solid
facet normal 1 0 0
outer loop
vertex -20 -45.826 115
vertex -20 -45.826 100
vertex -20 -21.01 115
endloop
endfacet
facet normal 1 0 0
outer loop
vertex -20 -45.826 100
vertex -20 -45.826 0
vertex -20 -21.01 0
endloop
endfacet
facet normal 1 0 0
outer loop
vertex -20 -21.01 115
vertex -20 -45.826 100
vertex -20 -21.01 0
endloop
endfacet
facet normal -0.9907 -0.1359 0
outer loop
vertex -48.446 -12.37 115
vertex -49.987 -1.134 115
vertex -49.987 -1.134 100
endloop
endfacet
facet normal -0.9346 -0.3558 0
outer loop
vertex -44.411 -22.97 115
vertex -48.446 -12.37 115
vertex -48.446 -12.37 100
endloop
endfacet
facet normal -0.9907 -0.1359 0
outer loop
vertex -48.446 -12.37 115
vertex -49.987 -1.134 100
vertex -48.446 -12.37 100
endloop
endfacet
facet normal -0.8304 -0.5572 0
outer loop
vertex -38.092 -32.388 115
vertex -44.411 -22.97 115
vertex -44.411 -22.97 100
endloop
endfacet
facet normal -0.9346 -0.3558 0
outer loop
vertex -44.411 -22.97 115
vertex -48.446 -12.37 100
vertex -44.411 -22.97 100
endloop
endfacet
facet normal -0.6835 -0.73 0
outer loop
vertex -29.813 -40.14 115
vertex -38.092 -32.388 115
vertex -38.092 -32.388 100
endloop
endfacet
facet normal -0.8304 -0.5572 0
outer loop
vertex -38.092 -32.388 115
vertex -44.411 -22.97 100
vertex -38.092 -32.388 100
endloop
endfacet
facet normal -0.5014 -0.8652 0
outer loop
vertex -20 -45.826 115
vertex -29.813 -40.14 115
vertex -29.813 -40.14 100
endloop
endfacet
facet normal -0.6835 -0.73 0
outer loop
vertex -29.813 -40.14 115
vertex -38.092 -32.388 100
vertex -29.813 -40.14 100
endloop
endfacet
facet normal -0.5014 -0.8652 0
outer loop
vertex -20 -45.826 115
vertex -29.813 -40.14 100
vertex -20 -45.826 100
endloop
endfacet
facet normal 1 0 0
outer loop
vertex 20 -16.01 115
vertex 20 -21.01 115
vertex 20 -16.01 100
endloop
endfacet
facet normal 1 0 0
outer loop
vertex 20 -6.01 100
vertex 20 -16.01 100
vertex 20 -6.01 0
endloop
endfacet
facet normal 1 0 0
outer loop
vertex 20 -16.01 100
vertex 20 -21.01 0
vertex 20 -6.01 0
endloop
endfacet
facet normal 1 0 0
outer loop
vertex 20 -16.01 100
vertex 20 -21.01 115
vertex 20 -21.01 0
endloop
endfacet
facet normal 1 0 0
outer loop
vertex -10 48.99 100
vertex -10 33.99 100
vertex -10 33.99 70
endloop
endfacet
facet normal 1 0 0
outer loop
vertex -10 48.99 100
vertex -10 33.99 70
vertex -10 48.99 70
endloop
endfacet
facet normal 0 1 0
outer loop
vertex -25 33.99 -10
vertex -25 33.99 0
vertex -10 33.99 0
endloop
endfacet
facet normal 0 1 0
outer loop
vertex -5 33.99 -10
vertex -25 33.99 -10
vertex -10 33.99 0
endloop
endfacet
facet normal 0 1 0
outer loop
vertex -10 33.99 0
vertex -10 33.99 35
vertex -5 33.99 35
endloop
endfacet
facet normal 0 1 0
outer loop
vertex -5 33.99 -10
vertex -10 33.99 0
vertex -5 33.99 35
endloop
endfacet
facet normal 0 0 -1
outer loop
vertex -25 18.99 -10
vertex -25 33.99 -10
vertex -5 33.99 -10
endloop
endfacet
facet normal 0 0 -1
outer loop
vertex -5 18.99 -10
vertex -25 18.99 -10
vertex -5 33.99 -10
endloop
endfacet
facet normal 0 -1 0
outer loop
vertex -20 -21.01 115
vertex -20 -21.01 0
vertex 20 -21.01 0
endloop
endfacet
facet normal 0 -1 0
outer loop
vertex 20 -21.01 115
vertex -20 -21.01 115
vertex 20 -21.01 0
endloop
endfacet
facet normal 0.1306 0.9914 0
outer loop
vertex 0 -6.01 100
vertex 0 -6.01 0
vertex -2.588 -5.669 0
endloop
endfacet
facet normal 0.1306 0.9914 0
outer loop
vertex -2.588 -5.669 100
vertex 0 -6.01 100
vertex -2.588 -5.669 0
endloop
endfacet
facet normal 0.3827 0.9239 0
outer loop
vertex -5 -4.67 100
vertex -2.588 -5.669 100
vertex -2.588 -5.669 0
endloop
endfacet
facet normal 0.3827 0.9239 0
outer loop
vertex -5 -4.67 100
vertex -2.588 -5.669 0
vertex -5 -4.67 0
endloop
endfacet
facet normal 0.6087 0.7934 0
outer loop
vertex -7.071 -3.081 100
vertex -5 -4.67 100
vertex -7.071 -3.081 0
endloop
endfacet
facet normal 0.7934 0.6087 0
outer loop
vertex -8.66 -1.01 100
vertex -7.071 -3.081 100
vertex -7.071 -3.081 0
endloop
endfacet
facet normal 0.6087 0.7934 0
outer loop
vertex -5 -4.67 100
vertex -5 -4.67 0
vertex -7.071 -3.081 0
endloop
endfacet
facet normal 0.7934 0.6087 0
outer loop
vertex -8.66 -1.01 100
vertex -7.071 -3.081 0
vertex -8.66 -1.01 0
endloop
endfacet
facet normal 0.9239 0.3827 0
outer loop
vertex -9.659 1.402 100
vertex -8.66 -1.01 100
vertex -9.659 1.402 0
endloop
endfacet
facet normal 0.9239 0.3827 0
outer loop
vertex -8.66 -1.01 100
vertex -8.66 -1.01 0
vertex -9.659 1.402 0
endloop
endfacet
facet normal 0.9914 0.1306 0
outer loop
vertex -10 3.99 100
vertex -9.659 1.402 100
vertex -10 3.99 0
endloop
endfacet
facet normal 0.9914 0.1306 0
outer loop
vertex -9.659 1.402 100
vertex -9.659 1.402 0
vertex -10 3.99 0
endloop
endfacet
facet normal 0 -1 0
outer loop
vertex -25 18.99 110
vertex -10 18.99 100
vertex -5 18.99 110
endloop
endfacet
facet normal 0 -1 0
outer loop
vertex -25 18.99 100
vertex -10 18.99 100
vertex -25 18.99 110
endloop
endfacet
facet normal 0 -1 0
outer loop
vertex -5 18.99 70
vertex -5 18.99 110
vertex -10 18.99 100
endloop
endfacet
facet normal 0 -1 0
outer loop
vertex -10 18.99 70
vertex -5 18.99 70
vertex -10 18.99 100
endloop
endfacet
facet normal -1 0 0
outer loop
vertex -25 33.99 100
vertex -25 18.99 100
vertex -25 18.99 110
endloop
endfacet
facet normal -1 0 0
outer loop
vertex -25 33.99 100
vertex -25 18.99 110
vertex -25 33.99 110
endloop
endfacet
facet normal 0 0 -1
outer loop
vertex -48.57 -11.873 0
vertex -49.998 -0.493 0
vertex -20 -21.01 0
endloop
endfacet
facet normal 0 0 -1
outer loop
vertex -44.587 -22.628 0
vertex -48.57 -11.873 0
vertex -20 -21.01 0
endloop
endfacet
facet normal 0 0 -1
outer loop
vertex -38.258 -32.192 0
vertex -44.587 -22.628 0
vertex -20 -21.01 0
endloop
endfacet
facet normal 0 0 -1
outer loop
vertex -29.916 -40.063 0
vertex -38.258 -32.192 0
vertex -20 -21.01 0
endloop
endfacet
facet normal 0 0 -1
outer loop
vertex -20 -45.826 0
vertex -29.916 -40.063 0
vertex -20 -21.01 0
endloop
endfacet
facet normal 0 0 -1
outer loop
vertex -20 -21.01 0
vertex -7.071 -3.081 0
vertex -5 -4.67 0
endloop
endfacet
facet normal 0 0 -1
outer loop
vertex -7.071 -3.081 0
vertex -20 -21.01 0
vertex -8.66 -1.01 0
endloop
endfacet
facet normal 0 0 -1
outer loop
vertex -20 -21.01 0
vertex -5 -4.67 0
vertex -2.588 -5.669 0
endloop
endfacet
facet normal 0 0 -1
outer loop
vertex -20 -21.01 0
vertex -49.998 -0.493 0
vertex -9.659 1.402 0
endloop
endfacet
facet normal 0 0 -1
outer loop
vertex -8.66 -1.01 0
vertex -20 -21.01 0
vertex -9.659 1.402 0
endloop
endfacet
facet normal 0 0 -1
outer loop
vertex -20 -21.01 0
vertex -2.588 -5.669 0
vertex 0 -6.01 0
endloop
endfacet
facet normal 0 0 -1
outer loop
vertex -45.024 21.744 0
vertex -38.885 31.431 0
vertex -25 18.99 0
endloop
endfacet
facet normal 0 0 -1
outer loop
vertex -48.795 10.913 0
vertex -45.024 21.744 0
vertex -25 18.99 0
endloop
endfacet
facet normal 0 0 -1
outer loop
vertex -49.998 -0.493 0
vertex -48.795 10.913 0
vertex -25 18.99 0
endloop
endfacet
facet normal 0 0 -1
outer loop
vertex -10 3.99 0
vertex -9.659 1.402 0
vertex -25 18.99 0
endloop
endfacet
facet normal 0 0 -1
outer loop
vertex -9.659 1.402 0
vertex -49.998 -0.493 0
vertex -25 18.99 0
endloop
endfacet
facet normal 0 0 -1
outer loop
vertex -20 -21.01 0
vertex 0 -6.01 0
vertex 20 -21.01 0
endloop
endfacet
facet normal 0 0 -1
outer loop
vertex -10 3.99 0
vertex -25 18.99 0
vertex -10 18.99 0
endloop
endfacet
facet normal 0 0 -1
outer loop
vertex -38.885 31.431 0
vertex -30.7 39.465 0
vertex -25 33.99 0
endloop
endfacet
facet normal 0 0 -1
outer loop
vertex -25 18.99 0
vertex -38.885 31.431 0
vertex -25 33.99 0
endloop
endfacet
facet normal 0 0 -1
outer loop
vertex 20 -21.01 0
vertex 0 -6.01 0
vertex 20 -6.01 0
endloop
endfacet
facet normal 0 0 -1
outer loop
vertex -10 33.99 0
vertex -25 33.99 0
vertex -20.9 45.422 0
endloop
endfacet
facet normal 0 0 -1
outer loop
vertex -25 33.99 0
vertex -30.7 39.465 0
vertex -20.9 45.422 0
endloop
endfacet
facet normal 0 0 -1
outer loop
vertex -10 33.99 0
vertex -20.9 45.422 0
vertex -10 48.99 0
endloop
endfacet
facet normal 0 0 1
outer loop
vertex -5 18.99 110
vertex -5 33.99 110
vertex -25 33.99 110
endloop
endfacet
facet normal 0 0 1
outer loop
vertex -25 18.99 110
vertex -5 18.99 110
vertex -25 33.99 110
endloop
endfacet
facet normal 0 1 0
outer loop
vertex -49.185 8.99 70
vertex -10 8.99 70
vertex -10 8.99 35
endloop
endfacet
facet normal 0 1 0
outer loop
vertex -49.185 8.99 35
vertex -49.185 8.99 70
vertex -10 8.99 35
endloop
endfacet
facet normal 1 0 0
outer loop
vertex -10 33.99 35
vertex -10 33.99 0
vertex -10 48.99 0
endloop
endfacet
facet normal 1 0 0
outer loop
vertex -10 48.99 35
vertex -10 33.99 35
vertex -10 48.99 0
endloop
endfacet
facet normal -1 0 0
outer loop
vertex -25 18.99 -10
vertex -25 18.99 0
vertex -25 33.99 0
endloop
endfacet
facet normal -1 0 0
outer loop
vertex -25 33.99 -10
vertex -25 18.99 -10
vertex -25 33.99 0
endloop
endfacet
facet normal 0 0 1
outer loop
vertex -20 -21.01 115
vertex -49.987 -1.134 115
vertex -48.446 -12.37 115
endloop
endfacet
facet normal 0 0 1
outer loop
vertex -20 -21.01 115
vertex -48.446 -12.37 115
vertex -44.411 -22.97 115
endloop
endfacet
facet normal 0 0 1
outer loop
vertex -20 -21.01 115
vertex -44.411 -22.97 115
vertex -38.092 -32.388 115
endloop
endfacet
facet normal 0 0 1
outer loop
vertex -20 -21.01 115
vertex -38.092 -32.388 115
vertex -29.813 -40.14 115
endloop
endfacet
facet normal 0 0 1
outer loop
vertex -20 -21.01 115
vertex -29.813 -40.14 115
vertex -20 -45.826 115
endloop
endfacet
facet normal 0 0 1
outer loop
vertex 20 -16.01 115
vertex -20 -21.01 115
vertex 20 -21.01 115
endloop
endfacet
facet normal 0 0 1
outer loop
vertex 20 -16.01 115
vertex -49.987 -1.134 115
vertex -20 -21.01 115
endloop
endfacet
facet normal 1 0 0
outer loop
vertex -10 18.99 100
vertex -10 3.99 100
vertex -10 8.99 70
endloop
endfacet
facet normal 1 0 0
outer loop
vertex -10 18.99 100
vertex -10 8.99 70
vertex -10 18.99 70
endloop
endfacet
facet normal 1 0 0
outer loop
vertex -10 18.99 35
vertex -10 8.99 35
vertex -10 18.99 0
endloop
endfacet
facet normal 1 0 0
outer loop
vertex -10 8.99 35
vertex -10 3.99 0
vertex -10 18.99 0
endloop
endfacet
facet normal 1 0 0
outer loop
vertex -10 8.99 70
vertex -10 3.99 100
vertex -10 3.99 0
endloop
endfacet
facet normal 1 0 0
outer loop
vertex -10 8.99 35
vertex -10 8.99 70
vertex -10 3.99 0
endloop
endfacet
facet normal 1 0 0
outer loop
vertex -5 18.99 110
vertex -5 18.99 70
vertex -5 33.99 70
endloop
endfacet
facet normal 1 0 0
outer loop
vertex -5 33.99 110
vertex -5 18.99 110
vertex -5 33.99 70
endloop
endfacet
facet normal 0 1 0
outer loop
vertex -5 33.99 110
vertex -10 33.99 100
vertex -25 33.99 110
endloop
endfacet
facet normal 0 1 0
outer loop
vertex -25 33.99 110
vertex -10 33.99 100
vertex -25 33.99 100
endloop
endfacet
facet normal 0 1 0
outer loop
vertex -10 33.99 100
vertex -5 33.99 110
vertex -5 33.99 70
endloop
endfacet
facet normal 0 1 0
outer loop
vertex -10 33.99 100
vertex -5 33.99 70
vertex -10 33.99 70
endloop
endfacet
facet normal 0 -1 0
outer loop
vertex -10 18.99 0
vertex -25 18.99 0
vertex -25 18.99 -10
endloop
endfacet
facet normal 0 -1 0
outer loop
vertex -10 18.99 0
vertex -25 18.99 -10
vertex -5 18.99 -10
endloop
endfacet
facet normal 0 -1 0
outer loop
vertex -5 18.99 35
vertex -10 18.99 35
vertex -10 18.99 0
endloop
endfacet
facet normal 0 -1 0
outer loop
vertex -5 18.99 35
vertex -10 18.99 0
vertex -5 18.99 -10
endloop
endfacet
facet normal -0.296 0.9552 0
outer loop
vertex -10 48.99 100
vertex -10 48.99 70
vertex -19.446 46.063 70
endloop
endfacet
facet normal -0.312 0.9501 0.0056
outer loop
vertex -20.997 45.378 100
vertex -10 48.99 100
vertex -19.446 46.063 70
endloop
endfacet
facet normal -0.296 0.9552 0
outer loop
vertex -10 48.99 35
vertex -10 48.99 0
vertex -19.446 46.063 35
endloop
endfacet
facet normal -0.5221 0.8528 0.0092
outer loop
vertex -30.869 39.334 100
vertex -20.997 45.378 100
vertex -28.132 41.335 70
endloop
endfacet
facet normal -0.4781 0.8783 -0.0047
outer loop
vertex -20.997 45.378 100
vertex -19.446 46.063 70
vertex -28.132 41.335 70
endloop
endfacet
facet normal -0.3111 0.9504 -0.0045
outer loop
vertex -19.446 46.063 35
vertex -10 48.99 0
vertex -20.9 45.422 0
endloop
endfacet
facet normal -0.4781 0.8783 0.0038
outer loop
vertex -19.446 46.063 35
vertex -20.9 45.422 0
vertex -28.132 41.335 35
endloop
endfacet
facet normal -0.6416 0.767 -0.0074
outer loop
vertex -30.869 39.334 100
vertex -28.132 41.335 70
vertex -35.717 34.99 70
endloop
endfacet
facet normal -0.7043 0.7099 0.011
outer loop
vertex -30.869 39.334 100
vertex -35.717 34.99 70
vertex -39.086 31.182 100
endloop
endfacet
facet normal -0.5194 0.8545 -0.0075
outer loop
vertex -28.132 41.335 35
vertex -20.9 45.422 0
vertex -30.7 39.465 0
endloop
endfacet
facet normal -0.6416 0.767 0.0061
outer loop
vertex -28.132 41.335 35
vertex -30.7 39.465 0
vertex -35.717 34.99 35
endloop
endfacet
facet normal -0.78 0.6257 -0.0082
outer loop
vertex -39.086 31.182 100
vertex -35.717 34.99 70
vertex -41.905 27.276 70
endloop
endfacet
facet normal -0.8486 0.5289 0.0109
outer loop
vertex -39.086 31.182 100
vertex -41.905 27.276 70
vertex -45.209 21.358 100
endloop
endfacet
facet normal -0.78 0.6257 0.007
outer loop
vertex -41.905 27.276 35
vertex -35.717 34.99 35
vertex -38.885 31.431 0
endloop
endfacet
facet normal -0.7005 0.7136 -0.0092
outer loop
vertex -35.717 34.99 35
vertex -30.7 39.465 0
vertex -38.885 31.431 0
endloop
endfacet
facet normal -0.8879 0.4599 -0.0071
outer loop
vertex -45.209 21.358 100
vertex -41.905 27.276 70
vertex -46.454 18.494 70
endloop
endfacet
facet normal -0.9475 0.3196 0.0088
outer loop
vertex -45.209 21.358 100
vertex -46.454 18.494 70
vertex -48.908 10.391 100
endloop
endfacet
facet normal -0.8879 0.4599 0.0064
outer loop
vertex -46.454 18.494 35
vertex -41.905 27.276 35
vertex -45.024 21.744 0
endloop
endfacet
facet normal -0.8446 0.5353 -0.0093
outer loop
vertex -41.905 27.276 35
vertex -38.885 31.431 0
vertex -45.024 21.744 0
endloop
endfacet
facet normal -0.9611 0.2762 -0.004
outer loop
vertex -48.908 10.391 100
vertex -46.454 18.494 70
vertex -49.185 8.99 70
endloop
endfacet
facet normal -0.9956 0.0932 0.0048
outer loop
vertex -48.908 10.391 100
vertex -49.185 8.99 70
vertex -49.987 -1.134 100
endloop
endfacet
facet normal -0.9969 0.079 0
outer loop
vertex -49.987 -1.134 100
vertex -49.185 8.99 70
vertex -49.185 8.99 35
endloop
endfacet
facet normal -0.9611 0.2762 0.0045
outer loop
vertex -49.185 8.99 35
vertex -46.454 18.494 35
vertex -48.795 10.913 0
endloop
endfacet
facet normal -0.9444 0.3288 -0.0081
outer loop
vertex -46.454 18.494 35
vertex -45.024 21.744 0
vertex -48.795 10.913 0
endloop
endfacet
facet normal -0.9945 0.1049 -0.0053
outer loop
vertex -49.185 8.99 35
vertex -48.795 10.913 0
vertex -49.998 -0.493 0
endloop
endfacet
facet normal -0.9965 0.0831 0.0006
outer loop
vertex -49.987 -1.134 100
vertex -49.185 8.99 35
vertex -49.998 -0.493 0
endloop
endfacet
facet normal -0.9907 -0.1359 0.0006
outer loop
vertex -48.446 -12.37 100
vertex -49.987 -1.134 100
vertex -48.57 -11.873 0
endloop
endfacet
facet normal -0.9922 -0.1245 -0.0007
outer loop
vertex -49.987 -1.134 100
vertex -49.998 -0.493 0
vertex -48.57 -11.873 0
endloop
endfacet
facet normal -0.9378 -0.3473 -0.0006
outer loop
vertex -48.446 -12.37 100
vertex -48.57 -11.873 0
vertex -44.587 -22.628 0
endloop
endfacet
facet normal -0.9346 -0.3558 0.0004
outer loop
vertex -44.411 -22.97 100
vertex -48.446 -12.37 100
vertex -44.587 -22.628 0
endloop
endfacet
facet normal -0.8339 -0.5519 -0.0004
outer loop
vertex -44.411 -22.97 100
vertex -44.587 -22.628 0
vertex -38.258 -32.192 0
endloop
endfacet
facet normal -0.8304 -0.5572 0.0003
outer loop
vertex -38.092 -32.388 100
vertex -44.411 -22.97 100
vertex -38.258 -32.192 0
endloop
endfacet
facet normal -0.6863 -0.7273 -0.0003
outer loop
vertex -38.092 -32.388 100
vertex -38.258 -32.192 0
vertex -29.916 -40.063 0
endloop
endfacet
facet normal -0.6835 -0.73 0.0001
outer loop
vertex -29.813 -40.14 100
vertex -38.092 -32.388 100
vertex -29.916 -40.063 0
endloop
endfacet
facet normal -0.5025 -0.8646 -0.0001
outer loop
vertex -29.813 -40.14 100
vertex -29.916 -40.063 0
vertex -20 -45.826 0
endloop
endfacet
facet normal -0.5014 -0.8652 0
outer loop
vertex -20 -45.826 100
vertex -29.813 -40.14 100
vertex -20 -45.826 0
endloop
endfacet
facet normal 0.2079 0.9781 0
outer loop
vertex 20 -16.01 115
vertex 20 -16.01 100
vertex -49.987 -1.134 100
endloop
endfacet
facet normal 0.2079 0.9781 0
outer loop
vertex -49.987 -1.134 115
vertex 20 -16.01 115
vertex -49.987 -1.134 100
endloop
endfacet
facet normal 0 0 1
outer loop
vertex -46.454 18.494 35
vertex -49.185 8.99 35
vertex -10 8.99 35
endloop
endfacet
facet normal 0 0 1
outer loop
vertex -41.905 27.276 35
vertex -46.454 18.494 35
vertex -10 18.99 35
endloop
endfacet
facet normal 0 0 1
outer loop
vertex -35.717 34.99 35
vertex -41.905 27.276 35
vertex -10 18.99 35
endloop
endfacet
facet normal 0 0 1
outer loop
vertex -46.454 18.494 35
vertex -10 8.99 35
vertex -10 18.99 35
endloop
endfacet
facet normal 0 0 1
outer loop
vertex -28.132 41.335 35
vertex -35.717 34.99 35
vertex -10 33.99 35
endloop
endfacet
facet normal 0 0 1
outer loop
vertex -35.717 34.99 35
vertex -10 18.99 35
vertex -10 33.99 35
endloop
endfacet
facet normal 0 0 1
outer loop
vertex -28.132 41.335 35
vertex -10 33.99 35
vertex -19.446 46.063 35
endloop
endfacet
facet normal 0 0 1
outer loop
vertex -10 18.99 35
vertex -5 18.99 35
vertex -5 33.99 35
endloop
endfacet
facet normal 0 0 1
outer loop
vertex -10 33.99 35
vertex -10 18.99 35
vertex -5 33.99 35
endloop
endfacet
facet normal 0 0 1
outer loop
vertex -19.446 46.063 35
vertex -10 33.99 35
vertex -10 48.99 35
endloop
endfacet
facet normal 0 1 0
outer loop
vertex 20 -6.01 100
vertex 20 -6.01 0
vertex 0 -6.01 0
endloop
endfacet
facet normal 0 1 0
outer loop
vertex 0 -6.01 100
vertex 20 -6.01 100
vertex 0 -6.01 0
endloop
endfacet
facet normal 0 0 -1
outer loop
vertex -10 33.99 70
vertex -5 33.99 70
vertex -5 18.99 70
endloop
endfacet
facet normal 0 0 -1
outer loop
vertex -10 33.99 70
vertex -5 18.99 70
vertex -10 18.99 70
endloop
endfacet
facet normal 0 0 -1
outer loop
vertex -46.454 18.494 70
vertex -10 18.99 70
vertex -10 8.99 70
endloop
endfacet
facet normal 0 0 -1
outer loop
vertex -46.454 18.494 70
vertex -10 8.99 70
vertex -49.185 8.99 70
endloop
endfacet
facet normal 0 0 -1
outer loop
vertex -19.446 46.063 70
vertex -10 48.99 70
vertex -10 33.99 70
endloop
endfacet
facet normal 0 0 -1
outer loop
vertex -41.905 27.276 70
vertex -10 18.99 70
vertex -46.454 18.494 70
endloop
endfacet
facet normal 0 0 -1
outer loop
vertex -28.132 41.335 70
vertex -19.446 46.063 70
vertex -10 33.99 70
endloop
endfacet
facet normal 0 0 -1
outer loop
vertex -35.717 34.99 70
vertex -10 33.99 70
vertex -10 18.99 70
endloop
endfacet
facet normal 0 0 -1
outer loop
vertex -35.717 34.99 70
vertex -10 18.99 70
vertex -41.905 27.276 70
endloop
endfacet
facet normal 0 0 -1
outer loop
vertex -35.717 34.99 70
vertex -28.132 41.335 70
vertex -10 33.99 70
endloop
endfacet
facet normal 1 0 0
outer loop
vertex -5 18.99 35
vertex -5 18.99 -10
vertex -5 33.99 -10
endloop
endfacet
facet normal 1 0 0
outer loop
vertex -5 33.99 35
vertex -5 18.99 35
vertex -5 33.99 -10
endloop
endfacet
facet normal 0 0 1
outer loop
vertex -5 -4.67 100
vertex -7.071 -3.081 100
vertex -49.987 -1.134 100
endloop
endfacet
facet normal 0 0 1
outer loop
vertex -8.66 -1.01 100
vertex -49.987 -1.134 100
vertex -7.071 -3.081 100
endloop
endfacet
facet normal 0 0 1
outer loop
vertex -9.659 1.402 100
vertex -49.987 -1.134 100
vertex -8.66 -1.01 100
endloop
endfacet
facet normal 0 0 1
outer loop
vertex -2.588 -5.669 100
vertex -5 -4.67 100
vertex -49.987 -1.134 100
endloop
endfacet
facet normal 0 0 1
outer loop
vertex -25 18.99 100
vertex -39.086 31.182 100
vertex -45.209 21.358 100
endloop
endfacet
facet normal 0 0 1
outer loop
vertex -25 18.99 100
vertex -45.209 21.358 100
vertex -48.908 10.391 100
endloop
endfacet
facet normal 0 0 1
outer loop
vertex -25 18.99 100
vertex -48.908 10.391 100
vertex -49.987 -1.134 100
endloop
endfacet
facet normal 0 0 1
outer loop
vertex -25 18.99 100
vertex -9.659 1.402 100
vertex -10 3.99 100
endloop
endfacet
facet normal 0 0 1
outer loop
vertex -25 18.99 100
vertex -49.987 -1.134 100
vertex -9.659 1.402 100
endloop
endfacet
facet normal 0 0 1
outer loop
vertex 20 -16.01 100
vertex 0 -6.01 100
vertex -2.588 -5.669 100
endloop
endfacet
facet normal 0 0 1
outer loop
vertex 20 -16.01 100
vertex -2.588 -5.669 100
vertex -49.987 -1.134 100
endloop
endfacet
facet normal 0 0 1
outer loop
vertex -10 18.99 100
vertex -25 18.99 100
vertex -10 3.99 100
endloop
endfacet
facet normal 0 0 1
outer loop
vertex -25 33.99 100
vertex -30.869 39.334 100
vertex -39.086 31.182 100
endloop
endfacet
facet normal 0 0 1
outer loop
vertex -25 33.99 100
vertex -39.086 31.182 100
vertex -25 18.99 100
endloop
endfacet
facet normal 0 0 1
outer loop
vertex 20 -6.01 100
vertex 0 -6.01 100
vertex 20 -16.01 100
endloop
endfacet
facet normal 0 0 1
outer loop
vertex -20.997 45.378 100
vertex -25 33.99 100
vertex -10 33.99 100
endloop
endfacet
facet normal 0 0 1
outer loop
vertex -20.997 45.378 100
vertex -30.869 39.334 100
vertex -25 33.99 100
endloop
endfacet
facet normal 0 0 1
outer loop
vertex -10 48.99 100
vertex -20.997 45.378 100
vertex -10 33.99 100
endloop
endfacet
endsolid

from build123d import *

# Parameters (mm, degrees)
BOSS_EXTRUDE1_DEPTH = 100
CUT_EXTRUDE1_REACH  = 42
SKETCH2_W           = 35
SKETCH2_H           = 40
SKETCH3_W           = 20
SKETCH3_H           = 15
BOSS_EXTRUDE2_DEPTH = 45
SKETCH4_W           = 20
SKETCH4_H           = 15
BOSS_EXTRUDE3_DEPTH = 40
BOSS_EXTRUDE4_DEPTH = 15


with BuildPart() as part:
    # Sketch1 → Boss-Extrude1 (new body)
    with BuildSketch(Plane.XY):
        with BuildLine():
            Line((-20, -45.82575695), (-20, -21.010205144))
            Line((-20, -21.010205144), (20, -21.010205144))
            Line((20, -21.010205144), (20, -6.010205144))
            Line((20, -6.010205144), (0, -6.010205144))
            ThreePointArc((0, -6.010205144), (-7.071067812, -3.081272956), (-10, 3.989794856))
            Line((-10, 3.989794856), (-10, 48.989794856))
            ThreePointArc((-10, 48.989794856), (-49.724211568, 5.244309675), (-20, -45.82575695))
        make_face()
    extrude(amount=BOSS_EXTRUDE1_DEPTH)

    # Sketch2 → Cut-Extrude1 (cut, up to next)
    with BuildSketch(Plane(origin=(-10, 0, 0), x_dir=(0, 0, -1), z_dir=(1, 0, 0)), mode=Mode.PRIVATE) as cut_extrude1_sk1:
        with Locations((-52.5, 28.989794856)):
            Rectangle(SKETCH2_W, SKETCH2_H)
    cut_extrude1_tool1 = extrude(cut_extrude1_sk1.sketch, amount=-CUT_EXTRUDE1_REACH, mode=Mode.PRIVATE) & part.part
    add(cut_extrude1_tool1.solids().sort_by_distance((-10, 28.989795, 52.5))[0], mode=Mode.SUBTRACT)

    # Sketch3 → Boss-Extrude2 (add)
    with BuildSketch(Plane.XY.offset(35)):
        with Locations((-15, 26.489794856)):
            Rectangle(SKETCH3_W, SKETCH3_H)
    extrude(amount=-BOSS_EXTRUDE2_DEPTH)

    # Sketch4 → Boss-Extrude3 (add)
    with BuildSketch(Plane(origin=(0, 0, 70), x_dir=(-1, 0, 0), z_dir=(0, 0, -1))):
        with Locations((15, 26.489794856)):
            Rectangle(SKETCH4_W, SKETCH4_H)
    extrude(amount=-BOSS_EXTRUDE3_DEPTH)

    # Sketch5 → Boss-Extrude4 (add)
    with BuildSketch(Plane.XY.offset(100)):
        with BuildLine():
            Line((20, -16.010205144), (-49.987139252, -1.133979464))
            ThreePointArc((-49.987139252, -1.133979464), (-41.519738184, -27.85877494), (-20, -45.82575695))
            Line((-20, -45.82575695), (-20, -21.010205144))
            Line((-20, -21.010205144), (20, -21.010205144))
            Line((20, -21.010205144), (20, -16.010205144))
        make_face()
    extrude(amount=BOSS_EXTRUDE4_DEPTH)


solid = part.part
